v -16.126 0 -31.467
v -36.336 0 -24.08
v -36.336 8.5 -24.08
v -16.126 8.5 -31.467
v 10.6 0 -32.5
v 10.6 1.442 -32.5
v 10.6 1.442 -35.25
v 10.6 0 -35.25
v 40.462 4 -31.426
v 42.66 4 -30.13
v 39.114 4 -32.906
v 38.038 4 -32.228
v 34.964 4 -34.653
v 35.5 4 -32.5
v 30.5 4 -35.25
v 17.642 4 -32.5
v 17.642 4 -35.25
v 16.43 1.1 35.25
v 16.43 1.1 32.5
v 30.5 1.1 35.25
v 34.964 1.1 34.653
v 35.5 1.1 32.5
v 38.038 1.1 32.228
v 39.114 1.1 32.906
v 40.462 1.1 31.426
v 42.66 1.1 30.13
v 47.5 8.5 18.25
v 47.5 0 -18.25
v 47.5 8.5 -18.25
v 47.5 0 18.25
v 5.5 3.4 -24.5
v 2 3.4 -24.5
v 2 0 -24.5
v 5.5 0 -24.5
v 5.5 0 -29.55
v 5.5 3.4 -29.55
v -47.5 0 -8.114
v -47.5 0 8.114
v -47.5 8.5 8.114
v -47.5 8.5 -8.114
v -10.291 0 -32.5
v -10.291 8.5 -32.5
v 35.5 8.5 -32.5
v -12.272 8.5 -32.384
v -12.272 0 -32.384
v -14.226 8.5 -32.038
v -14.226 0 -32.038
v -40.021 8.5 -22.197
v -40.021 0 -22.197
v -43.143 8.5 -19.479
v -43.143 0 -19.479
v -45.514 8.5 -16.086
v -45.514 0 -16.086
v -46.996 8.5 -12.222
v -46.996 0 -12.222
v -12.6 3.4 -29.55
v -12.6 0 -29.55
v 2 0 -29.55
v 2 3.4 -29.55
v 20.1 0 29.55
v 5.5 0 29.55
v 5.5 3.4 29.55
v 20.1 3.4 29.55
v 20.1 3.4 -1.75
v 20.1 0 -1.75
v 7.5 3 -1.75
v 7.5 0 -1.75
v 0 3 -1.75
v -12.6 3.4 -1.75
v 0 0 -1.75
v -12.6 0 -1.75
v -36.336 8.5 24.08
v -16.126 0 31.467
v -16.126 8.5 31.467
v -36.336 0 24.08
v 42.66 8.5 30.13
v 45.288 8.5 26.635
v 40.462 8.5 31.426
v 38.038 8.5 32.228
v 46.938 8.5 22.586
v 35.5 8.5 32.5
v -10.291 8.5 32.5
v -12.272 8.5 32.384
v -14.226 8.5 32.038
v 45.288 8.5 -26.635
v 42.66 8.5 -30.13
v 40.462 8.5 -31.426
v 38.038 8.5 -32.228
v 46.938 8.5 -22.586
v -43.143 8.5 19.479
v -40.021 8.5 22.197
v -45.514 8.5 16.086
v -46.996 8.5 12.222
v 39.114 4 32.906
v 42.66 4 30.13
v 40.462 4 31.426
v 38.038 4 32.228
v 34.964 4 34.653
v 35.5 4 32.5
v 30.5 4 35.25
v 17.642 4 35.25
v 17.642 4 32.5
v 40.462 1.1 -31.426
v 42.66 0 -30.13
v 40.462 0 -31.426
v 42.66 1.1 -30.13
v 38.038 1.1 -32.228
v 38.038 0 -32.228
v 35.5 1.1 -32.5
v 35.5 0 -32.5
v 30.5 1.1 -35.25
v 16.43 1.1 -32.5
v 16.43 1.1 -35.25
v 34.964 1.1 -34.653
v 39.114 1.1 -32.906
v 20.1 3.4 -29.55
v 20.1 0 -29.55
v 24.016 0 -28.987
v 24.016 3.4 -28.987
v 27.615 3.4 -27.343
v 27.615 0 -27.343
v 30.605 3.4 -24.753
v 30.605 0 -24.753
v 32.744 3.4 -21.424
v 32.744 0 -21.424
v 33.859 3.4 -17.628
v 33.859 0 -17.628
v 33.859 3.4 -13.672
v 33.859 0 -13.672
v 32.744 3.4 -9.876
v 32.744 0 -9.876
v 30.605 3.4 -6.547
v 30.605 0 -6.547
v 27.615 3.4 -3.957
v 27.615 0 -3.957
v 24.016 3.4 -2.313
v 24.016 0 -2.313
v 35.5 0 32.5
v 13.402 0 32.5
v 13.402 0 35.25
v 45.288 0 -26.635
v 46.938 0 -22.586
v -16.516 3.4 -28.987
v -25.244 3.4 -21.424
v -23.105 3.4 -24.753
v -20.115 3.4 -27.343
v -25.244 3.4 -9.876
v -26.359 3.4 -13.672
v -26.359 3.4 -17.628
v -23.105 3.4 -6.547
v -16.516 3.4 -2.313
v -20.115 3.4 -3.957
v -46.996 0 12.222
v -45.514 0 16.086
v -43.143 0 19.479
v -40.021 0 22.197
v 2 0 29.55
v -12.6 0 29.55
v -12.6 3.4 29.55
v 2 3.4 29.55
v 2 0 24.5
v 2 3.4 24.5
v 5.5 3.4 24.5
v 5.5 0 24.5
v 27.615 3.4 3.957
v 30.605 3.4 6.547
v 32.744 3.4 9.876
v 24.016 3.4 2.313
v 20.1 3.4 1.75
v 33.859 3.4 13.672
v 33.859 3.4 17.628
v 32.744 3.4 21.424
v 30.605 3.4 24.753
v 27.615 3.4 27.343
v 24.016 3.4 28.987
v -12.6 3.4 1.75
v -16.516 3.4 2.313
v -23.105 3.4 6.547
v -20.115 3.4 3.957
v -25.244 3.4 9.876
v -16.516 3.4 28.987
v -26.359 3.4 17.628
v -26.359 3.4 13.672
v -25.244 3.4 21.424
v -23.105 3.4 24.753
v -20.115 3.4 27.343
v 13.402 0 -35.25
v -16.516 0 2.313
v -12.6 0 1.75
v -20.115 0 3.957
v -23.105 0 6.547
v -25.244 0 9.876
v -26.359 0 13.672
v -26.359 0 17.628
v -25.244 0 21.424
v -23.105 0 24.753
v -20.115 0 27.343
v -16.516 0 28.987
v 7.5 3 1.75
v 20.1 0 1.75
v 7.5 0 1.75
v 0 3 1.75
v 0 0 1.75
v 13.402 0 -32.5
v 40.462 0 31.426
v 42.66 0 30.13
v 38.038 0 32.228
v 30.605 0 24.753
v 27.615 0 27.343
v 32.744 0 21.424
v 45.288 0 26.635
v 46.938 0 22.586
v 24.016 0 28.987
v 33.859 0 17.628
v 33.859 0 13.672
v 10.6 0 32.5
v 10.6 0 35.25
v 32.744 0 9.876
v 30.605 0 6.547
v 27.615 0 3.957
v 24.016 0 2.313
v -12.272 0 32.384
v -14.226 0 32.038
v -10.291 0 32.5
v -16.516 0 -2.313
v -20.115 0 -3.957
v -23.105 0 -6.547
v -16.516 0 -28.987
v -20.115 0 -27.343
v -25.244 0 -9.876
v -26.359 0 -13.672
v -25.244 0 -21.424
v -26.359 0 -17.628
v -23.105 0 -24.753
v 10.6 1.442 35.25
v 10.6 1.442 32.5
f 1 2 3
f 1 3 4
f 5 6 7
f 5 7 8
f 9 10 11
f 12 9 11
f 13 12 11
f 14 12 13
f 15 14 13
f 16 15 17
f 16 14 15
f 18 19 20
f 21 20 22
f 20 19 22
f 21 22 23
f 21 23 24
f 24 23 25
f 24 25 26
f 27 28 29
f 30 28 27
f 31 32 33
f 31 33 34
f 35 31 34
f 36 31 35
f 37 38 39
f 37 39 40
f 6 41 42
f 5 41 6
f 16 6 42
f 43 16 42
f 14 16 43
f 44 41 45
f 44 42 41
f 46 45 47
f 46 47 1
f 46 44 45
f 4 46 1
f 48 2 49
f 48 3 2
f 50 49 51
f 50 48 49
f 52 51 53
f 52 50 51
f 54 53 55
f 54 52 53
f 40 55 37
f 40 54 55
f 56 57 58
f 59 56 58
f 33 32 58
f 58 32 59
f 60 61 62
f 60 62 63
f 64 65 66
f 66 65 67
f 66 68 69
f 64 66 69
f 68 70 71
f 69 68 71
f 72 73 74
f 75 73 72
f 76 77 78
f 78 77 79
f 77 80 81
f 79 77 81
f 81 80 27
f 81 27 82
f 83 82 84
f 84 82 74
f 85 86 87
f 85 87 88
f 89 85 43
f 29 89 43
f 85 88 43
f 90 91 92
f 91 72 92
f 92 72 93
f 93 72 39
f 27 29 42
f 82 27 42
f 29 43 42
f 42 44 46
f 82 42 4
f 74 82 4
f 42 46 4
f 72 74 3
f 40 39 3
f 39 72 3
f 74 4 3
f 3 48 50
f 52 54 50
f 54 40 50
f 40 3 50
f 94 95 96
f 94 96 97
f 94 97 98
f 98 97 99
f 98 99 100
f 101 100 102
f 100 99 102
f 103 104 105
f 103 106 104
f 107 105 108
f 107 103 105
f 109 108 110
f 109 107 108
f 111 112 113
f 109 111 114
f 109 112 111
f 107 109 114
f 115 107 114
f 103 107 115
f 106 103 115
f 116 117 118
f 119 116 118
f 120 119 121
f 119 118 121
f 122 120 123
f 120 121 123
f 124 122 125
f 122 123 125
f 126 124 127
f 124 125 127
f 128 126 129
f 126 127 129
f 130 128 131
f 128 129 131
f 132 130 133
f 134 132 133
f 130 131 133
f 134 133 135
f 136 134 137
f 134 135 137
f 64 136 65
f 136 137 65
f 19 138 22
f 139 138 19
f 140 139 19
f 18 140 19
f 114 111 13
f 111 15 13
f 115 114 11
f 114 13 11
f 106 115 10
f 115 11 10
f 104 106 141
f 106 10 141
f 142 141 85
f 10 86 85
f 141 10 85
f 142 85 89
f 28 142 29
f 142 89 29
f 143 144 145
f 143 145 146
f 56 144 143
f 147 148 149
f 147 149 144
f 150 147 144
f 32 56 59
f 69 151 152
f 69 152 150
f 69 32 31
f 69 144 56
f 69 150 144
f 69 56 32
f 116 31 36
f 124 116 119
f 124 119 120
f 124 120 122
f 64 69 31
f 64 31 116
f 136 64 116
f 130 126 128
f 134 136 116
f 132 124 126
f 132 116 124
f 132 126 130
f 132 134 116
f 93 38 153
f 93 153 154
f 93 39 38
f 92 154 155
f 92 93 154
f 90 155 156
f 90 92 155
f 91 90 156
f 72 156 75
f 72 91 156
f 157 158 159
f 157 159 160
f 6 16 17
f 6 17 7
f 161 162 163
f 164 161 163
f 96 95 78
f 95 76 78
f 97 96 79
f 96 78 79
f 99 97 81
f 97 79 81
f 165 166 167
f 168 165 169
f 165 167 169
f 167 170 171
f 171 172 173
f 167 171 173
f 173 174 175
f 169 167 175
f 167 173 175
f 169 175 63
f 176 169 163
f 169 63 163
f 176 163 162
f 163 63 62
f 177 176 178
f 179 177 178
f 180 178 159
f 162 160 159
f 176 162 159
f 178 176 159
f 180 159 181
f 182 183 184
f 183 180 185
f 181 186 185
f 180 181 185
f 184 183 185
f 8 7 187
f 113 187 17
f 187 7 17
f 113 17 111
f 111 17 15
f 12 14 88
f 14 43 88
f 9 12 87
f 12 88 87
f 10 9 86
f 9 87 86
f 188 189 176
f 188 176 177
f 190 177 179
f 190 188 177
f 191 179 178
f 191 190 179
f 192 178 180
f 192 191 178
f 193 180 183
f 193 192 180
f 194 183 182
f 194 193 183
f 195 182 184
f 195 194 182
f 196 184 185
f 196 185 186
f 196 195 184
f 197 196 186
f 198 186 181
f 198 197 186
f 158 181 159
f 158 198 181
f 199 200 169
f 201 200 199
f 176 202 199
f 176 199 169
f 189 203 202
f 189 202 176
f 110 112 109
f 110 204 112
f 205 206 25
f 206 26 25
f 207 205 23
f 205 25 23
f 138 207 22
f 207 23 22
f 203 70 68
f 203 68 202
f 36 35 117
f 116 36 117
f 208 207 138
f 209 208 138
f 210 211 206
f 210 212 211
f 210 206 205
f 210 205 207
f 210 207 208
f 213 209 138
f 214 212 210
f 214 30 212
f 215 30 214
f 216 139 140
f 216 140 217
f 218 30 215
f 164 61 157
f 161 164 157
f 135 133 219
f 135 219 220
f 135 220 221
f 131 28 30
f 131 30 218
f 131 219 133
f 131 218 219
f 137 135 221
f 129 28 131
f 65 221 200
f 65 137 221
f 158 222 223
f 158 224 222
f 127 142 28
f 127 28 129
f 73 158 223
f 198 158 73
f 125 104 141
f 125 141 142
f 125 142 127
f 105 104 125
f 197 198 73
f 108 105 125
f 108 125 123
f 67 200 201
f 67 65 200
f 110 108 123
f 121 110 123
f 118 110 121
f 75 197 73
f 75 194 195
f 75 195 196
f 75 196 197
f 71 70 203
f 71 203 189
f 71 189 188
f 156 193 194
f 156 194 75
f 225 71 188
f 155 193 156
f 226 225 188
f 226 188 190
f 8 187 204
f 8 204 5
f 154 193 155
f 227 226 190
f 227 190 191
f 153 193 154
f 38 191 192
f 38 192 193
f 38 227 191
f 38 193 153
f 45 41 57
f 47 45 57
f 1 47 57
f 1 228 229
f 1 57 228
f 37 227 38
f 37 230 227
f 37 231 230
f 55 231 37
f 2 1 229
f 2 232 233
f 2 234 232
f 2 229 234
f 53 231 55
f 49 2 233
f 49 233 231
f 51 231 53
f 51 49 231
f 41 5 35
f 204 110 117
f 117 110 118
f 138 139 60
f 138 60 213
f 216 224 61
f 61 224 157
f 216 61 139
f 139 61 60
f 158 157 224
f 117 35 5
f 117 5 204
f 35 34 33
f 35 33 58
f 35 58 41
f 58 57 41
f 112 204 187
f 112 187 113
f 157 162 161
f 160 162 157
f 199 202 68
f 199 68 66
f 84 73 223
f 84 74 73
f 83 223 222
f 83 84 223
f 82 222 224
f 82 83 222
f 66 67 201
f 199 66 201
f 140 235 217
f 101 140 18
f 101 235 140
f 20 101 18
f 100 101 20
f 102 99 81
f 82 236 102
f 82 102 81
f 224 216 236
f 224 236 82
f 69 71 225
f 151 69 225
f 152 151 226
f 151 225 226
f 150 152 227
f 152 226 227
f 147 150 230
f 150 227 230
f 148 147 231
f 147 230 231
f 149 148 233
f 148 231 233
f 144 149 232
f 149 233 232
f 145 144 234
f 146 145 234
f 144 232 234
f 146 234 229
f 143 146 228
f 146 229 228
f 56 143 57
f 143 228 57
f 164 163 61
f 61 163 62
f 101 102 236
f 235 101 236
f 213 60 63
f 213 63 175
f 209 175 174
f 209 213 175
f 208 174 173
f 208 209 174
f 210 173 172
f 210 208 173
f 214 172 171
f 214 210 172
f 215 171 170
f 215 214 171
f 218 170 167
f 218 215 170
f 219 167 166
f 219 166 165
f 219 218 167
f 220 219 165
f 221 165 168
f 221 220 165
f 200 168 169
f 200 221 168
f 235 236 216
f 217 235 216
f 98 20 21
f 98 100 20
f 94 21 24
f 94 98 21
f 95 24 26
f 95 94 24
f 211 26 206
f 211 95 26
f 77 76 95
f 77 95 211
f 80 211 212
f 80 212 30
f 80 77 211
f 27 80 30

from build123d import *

# Parameters (mm, degrees)
EXTRUDE_1_DEPTH     = 8.5
CUT_EXTRUDE_1_DEPTH = 3.4
SKETCH_7_W          = 3.5
SKETCH_7_H          = 5.05
EXTRUDE_2_DEPTH     = 3.4
SKETCH_8_W          = 7.5
SKETCH_8_H          = 3.5
CUT_EXTRUDE_2_DEPTH = 3
EXTRUDE_3_DEPTH     = 2.75
FILLET_2_R          = 12
FILLET_3_R          = 17
FILLET_4_R          = 17


with BuildPart() as part:
    # 草图1 → 凸台-拉伸1 (new body)
    with BuildSketch(Plane(origin=(0, 0, 0), x_dir=(1, 0, 0), z_dir=(0, 1, 0))):
        Polygon((-47.5, 20), (-13.3, 32.5), (47.5, 32.5), (47.5, -32.5), (-13.3, -32.5), (-47.5, -20), align=None)
    extrude(amount=EXTRUDE_1_DEPTH)

    # 草图3 → 切除-拉伸1 (cut)
    with BuildSketch(Plane.XZ):
        with BuildLine():
            Line((-12.6, 29.55), (20.1, 29.55))
            ThreePointArc((20.1, 29.55), (34, 15.65), (20.1, 1.75))
            Line((20.1, 1.75), (-12.6, 1.75))
            ThreePointArc((-12.6, 1.75), (-26.5, 15.65), (-12.6, 29.55))
        make_face()
        with BuildLine():
            Line((-12.6, -29.55), (20.1, -29.55))
            ThreePointArc((20.1, -29.55), (34, -15.65), (20.1, -1.75))
            Line((20.1, -1.75), (-12.6, -1.75))
            ThreePointArc((-12.6, -1.75), (-26.5, -15.65), (-12.6, -29.55))
        make_face()
    extrude(amount=-CUT_EXTRUDE_1_DEPTH, mode=Mode.SUBTRACT)

    # 草图7 → 凸台-拉伸2 (add)
    with BuildSketch(Plane.XZ.offset(-3.4)):
        with Locations((3.75, 27.025)):
            Rectangle(SKETCH_7_W, SKETCH_7_H)
    extrude_2 = extrude(amount=EXTRUDE_2_DEPTH)

    # 镜向1: 凸台-拉伸2 across plane
    add(extrude_2.mirror(Plane.XY))

    # 草图8 → 切除-拉伸2 (cut)
    with BuildSketch(Plane.XZ):
        with Locations((3.75, 0)):
            Rectangle(SKETCH_8_W, SKETCH_8_H)
    extrude(amount=-CUT_EXTRUDE_2_DEPTH, mode=Mode.SUBTRACT)

    # 草图10 → 凸台-拉伸3 (add)
    with BuildSketch(Plane.XY.offset(32.5)):
        Polygon((16.429732781, 1.1), (47.5, 1.1), (47.5, 4), (17.642356602, 4), (10.6, 1.44163271), (10.6, 0), (13.401789026, 0), align=None)
    extrude_3 = extrude(amount=EXTRUDE_3_DEPTH)

    # 镜向2: 凸台-拉伸3 across plane
    add(extrude_3.mirror(Plane.XY))

    # 圆角2
    fillet_2_edges = [part.edges().sort_by_distance(p)[0] for p in [
        (47.5, 6.25, 32.5),
        (47.5, 0.55, -32.5),
        (47.5, 6.25, -32.5),
        (47.5, 0.55, 32.5),
    ]]
    fillet(fillet_2_edges, radius=FILLET_2_R)

    # 圆角3
    fillet_3_edges = [part.edges().sort_by_distance(p)[0] for p in [
        (47.5, 2.55, 35.25),
        (47.5, 2.55, -35.25),
    ]]
    fillet(fillet_3_edges, radius=FILLET_3_R)

    # 圆角4
    fillet_4_edges = [part.edges().sort_by_distance(p)[0] for p in [
        (-13.3, 4.25, 32.5),
        (-47.5, 4.25, 20),
        (-47.5, 4.25, -20),
        (-13.3, 4.25, -32.5),
    ]]
    fillet(fillet_4_edges, radius=FILLET_4_R)


solid = part.part
